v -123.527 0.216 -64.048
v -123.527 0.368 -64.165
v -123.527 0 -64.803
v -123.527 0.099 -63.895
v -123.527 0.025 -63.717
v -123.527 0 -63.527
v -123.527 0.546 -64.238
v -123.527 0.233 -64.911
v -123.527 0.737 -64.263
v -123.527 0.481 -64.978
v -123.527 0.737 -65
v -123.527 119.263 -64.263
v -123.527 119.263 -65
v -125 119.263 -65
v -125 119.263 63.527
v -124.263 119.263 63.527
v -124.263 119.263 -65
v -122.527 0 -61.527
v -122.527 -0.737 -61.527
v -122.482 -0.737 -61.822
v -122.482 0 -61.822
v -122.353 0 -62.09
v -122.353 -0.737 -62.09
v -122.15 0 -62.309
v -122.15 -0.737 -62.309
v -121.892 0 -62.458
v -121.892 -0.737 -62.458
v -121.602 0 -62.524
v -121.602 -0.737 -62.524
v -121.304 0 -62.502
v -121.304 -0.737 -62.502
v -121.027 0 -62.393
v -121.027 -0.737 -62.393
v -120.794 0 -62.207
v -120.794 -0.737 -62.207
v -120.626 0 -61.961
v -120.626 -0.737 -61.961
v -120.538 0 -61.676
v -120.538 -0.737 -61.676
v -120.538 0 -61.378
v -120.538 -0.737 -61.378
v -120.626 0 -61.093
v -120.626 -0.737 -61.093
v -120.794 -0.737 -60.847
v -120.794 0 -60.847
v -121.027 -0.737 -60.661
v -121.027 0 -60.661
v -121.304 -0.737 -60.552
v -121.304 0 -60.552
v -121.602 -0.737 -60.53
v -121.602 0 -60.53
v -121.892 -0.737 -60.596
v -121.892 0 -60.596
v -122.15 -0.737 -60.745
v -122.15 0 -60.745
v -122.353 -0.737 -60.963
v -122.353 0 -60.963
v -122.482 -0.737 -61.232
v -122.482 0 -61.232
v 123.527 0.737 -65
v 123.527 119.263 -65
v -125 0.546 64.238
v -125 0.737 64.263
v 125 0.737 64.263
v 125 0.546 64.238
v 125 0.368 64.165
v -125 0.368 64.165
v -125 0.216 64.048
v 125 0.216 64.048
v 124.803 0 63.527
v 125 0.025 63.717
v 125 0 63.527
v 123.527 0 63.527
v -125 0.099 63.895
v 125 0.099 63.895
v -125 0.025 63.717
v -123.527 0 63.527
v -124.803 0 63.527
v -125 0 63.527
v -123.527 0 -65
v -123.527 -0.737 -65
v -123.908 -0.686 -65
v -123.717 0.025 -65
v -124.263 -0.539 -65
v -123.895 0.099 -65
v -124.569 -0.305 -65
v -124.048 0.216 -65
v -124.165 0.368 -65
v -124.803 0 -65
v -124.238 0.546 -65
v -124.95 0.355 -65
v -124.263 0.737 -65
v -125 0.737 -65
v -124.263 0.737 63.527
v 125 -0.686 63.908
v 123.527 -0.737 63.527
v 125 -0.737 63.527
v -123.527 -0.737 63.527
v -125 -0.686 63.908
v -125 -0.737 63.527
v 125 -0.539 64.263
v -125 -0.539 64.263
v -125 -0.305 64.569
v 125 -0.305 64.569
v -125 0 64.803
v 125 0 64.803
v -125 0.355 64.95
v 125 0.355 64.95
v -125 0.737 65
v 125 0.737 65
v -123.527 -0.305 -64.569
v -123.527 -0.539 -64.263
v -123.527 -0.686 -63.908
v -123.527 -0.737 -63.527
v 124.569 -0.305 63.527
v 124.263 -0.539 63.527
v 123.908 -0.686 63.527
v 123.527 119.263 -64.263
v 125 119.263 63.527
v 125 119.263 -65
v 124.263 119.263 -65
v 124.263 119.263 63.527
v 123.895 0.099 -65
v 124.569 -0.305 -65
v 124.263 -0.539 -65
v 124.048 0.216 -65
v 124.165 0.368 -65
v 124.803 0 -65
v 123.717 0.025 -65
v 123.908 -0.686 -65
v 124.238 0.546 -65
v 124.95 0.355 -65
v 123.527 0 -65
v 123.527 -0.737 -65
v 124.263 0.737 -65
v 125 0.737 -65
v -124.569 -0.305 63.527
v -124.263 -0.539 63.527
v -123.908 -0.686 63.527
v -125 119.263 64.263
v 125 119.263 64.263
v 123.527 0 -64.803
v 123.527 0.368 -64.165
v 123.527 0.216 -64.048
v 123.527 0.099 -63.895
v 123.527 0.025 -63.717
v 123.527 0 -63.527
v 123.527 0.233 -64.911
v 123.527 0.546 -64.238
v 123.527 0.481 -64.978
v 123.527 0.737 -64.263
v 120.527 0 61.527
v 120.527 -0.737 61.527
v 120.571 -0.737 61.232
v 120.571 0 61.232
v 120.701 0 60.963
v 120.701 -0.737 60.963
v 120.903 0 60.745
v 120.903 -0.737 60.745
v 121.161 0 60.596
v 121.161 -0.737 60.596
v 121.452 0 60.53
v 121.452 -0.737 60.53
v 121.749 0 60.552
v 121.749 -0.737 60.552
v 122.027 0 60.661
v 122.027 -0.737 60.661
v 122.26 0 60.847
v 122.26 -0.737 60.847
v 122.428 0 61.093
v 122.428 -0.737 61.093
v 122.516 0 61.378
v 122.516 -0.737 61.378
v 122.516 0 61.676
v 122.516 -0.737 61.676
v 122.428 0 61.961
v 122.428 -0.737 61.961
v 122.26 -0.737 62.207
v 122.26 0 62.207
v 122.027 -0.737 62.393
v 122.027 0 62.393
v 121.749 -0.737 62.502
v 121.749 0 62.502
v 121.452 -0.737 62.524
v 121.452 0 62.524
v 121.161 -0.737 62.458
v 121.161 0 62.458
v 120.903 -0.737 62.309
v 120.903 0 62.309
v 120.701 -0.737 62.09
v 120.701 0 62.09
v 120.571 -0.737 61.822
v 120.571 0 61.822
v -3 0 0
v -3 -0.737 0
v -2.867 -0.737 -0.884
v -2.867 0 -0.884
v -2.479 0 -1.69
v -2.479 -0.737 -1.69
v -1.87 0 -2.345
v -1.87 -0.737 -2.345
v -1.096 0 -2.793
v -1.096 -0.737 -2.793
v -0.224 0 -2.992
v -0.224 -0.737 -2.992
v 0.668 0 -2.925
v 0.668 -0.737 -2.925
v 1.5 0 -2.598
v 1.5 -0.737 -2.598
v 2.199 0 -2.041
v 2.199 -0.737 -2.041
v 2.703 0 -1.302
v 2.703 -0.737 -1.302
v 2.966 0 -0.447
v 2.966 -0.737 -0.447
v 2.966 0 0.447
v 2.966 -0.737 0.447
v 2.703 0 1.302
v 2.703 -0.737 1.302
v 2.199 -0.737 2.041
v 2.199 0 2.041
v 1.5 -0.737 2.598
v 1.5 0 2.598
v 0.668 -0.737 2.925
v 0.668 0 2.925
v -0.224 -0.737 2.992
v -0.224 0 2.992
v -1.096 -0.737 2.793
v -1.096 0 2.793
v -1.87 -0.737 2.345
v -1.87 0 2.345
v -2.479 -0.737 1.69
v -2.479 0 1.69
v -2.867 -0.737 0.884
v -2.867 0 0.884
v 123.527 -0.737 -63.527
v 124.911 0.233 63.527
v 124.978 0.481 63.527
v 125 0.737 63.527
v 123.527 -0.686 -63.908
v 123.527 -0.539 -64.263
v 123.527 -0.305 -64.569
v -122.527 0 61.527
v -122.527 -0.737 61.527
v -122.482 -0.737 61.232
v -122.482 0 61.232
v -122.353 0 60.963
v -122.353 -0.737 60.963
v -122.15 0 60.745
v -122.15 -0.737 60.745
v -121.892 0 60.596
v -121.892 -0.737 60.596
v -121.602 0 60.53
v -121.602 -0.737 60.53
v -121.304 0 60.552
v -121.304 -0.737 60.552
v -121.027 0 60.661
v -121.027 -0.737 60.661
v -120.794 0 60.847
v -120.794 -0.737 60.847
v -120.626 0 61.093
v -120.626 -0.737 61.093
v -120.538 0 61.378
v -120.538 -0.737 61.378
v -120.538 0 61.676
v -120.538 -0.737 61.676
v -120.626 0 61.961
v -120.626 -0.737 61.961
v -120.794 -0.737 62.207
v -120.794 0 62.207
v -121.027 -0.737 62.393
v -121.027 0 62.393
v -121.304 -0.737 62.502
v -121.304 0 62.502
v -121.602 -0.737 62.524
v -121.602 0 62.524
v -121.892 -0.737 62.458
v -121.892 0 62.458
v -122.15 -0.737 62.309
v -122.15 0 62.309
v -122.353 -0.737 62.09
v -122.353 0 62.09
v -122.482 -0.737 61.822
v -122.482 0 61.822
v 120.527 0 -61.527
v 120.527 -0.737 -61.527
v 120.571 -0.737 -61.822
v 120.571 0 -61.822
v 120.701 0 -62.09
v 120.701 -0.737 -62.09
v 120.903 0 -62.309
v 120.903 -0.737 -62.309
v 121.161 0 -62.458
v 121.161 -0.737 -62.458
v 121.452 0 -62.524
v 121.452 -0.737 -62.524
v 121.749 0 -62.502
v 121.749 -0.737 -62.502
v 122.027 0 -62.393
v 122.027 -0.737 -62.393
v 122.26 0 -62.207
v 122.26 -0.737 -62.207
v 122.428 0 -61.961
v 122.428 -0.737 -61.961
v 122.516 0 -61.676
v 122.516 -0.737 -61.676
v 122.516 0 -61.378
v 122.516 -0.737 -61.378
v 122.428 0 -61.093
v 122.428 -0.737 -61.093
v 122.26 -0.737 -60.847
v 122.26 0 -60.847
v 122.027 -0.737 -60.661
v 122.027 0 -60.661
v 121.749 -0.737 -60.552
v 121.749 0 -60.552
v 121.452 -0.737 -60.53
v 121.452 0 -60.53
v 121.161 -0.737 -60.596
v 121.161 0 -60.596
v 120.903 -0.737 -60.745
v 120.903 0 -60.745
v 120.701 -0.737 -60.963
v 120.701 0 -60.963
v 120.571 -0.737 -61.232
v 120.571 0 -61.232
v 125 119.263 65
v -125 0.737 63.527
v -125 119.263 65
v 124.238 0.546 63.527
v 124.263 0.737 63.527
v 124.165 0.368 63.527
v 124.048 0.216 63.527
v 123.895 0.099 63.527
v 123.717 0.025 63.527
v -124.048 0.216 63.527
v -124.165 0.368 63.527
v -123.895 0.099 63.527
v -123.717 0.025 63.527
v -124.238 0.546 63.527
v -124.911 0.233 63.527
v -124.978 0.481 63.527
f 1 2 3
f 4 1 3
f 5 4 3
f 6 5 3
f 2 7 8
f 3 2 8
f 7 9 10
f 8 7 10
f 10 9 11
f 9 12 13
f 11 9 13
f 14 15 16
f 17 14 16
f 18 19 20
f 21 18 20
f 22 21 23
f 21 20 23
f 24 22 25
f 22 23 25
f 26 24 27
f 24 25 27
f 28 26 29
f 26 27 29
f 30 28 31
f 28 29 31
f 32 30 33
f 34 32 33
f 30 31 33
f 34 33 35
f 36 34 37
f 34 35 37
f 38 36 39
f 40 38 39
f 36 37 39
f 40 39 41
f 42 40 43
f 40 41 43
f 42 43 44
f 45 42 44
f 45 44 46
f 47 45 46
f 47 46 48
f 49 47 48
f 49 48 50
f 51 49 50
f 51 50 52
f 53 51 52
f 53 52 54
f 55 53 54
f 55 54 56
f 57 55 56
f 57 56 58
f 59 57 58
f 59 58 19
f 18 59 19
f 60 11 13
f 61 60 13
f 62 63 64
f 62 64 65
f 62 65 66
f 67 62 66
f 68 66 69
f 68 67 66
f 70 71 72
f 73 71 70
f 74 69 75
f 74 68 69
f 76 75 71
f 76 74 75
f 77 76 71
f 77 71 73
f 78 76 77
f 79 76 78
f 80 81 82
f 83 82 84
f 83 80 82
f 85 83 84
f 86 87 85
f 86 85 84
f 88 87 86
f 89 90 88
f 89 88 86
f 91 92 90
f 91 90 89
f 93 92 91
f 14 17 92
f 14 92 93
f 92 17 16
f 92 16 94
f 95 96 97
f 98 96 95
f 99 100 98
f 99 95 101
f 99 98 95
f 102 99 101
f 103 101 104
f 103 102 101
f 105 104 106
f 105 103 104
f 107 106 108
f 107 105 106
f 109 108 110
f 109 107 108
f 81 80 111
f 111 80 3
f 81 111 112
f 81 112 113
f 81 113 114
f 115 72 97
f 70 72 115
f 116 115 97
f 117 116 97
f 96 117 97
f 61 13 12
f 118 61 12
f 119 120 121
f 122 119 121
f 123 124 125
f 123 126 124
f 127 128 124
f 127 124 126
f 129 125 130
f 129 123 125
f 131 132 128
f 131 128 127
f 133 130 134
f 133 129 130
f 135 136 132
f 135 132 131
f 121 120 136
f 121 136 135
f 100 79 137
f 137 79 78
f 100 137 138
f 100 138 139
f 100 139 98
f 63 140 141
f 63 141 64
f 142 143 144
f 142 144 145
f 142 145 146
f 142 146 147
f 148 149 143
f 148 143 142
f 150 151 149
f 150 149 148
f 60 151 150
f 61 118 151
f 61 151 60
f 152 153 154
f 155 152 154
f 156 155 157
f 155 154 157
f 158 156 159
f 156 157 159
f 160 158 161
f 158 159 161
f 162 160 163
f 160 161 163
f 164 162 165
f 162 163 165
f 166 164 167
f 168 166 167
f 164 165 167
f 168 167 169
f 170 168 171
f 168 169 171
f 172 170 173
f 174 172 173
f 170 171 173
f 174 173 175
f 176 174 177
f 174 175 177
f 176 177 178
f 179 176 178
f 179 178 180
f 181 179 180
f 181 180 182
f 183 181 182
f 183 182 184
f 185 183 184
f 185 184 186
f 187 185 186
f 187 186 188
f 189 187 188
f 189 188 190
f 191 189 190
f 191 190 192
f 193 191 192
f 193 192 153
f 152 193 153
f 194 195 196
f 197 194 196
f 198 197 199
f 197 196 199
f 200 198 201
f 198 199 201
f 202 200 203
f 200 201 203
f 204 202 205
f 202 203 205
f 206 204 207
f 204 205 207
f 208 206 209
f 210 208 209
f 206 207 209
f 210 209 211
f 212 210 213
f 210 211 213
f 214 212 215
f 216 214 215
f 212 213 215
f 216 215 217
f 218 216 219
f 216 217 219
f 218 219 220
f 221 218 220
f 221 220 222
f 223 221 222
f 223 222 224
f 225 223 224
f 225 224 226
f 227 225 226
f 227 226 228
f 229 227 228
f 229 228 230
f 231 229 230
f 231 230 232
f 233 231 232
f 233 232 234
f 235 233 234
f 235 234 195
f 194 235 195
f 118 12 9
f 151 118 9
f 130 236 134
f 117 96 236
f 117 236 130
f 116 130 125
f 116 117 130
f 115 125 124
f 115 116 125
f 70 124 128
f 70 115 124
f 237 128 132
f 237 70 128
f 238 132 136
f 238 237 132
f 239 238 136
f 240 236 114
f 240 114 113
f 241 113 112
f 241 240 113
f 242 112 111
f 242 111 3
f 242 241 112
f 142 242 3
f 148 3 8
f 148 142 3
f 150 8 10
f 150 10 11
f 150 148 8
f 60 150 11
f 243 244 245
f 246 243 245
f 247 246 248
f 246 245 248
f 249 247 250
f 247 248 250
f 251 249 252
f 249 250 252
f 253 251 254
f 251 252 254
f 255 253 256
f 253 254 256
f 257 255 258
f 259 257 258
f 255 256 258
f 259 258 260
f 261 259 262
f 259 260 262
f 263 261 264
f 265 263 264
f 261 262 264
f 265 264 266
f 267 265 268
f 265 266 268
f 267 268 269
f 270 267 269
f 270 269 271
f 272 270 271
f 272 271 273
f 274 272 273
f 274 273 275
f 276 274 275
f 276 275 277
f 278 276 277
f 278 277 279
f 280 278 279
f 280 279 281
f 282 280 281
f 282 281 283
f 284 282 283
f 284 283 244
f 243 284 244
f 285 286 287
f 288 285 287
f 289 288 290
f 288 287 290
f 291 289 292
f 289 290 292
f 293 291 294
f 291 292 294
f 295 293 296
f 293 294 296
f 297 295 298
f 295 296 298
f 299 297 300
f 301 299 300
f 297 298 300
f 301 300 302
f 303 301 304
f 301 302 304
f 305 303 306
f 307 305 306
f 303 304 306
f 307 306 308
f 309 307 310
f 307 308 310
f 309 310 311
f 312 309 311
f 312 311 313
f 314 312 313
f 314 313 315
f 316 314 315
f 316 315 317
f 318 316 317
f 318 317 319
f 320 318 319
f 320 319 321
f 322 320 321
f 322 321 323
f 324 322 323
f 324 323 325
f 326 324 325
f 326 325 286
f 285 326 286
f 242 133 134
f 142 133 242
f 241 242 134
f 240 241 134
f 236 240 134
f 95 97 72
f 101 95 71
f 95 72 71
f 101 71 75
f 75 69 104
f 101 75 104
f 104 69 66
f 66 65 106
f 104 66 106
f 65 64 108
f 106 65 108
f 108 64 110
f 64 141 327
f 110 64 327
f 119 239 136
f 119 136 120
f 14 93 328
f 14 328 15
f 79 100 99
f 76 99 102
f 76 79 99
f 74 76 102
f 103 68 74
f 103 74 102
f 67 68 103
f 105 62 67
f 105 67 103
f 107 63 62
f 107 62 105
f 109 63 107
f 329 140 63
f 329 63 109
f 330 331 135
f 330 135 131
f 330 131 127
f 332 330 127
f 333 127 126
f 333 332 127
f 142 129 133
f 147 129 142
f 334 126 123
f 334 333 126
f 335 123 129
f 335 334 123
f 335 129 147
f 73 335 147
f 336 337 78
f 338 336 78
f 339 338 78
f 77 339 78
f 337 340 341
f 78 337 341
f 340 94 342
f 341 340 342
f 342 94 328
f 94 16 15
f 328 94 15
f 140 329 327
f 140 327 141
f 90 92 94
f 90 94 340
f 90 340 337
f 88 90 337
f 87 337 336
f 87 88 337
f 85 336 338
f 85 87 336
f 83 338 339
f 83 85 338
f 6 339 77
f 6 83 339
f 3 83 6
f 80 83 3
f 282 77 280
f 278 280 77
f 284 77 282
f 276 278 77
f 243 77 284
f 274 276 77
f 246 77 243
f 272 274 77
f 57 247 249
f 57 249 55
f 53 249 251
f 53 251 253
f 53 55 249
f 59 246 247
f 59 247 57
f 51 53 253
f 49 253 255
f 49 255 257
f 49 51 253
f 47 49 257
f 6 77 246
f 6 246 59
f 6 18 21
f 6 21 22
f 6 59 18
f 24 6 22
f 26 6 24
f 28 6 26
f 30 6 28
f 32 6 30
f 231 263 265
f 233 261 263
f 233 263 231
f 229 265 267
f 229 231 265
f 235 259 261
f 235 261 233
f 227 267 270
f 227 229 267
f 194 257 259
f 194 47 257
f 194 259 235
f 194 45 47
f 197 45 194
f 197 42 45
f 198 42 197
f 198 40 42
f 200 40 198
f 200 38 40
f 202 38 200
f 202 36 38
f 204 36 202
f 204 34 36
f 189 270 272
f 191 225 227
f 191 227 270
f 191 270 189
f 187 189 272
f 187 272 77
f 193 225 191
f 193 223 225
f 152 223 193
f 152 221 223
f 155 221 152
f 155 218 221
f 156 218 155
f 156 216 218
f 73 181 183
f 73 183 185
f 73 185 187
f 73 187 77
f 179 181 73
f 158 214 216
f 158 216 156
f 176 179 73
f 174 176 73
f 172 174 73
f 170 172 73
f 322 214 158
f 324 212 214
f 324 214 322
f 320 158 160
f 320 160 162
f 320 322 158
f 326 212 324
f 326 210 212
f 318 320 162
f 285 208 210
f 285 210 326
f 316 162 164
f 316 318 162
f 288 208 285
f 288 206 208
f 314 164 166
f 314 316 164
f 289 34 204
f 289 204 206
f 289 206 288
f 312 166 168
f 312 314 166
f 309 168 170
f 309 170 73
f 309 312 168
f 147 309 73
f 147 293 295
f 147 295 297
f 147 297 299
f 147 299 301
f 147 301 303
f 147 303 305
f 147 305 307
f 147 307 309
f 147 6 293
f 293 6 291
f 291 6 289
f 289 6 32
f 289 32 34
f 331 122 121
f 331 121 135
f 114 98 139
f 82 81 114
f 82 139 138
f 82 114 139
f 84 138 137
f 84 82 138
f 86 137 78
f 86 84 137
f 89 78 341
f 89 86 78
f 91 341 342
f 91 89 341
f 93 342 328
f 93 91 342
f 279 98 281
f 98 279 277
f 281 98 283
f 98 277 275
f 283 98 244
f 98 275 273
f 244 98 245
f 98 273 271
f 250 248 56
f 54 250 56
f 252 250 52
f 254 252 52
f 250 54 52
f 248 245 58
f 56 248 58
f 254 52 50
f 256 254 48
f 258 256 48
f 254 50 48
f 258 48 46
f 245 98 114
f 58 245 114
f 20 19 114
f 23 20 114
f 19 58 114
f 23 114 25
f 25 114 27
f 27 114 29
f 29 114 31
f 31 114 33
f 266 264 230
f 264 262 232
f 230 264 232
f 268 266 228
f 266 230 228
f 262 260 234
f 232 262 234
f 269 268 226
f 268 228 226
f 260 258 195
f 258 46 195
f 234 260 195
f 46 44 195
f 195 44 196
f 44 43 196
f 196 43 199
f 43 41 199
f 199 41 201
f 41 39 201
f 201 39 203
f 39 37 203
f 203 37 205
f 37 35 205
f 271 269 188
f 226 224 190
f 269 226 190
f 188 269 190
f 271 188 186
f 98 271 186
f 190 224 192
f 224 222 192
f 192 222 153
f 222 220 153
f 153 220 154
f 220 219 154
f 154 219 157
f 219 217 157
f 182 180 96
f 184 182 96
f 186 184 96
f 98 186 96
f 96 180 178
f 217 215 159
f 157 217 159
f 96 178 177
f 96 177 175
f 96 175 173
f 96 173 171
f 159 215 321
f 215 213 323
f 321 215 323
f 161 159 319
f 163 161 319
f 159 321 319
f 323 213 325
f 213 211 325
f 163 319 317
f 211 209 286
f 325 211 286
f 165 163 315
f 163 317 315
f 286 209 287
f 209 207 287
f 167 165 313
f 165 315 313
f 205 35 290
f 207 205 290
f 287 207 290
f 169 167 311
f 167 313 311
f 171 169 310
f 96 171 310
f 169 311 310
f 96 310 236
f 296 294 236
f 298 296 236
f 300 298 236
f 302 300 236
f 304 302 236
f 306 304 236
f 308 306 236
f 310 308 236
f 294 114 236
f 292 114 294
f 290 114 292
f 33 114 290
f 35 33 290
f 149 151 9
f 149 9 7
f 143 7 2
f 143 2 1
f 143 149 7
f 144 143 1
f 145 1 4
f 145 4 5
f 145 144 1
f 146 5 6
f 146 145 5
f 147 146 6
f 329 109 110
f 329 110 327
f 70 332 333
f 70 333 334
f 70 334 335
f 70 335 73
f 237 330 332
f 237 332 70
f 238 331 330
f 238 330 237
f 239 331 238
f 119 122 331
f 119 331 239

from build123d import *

# Parameters (mm, degrees)
SKETCH1_W                    = 250
SKETCH1_H                    = 130
BASE_FLANGE1_DEPTH           = 0.7366
F_6_0_6_DIAMETER_HOLE1_D     = 6
EDGE_FLANGE1_STRIP_W         = 4.4196
EDGE_FLANGE1_STRIP_H         = 0.7366
EDGE_FLANGE1_STRIP_CUT_DEPTH = 250
EDGE_FLANGE1_DEPTH           = 250
EDGE_FLANGE2_STRIP_W         = 4.4196
EDGE_FLANGE2_STRIP_H         = 0.7366
EDGE_FLANGE2_STRIP_CUT_DEPTH = 128.5268
EDGE_FLANGE2_DEPTH           = 128.5268
EDGE_FLANGE3_STRIP_W         = 4.4196
EDGE_FLANGE3_STRIP_H         = 0.7366
EDGE_FLANGE3_STRIP_CUT_DEPTH = 128.5268
EDGE_FLANGE3_DEPTH           = 128.5268
EDGE_FLANGE4_STRIP_W         = 4.4196
EDGE_FLANGE4_STRIP_H         = 0.7366
EDGE_FLANGE4_STRIP_CUT_DEPTH = 247.0536
EDGE_FLANGE4_DEPTH           = 247.0536
F_2_0_2_DIAMETER_HOLE2_D     = 2
F_2_0_2_DIAMETER_HOLE3_D     = 2


# Sheet-metal steps are written as plain solids
with BuildPart() as part:
    # Sketch1 → Base-Flange1 (new body)
    with BuildSketch(Plane(origin=(0, 0, 0), x_dir=(1, 0, 0), z_dir=(0, 1, 0))):
        Rectangle(SKETCH1_W, SKETCH1_H)
    extrude(amount=-BASE_FLANGE1_DEPTH)

    # Ø6.0 (6) Diameter Hole1 (through all)
    with Locations(Plane(origin=(0, 0, 0), x_dir=(1, 0, 0), z_dir=(0, 1, 0))):
        with Locations((0, 0)):
            Hole(F_6_0_6_DIAMETER_HOLE1_D / 2)

    # Edge-Flange1 strip (across the edge) → Edge-Flange1 strip cut (cut)
    with BuildSketch(Plane(origin=(-125, 0, 65), x_dir=(0, 0, -1), z_dir=(1, 0, 0))):
        with Locations((-0.7366, -0.3683)):
            Rectangle(EDGE_FLANGE1_STRIP_W, EDGE_FLANGE1_STRIP_H)
    extrude(amount=EDGE_FLANGE1_STRIP_CUT_DEPTH, mode=Mode.SUBTRACT)

    # Edge-Flange1 section (across the edge) → Edge-Flange1 (add)
    with BuildSketch(Plane(origin=(-125, 0, 65), x_dir=(0, 0, -1), z_dir=(1, 0, 0))):
        with BuildLine():
            Line((0, 0.7366), (0, 119.2634))
            Line((0, 119.2634), (0.7366, 119.2634))
            Line((0.7366, 119.2634), (0.7366, 0.7366))
            ThreePointArc((0.7366, 0.7366), (0.952345145, 0.215745145), (1.4732, 0))
            Line((1.4732, 0), (1.4732, -0.7366))
            ThreePointArc((1.4732, -0.7366), (0.43149029, -0.30510971), (0, 0.7366))
        make_face()
    extrude(amount=EDGE_FLANGE1_DEPTH)

    # Edge-Flange2 strip (across the edge) → Edge-Flange2 strip cut (cut)
    with BuildSketch(Plane(origin=(125, 0, 63.5268), x_dir=(-1, 0, 0), z_dir=(0, 0, -1))):
        with Locations((-0.7366, -0.3683)):
            Rectangle(EDGE_FLANGE2_STRIP_W, EDGE_FLANGE2_STRIP_H)
    extrude(amount=EDGE_FLANGE2_STRIP_CUT_DEPTH, mode=Mode.SUBTRACT)

    # Edge-Flange2 section (across the edge) → Edge-Flange2 (add)
    with BuildSketch(Plane(origin=(125, 0, 63.5268), x_dir=(-1, 0, 0), z_dir=(0, 0, -1))):
        with BuildLine():
            Line((0, 0.7366), (0, 119.2634))
            Line((0, 119.2634), (0.7366, 119.2634))
            Line((0.7366, 119.2634), (0.7366, 0.7366))
            ThreePointArc((0.7366, 0.7366), (0.952345145, 0.215745145), (1.4732, 0))
            Line((1.4732, 0), (1.4732, -0.7366))
            ThreePointArc((1.4732, -0.7366), (0.43149029, -0.30510971), (0, 0.7366))
        make_face()
    extrude(amount=EDGE_FLANGE2_DEPTH)

    # Edge-Flange3 strip (across the edge) → Edge-Flange3 strip cut (cut)
    with BuildSketch(Plane(origin=(-125, 0, -65), x_dir=(1, 0, 0), z_dir=(0, 0, 1))):
        with Locations((-0.7366, -0.3683)):
            Rectangle(EDGE_FLANGE3_STRIP_W, EDGE_FLANGE3_STRIP_H)
    extrude(amount=EDGE_FLANGE3_STRIP_CUT_DEPTH, mode=Mode.SUBTRACT)

    # Edge-Flange3 section (across the edge) → Edge-Flange3 (add)
    with BuildSketch(Plane(origin=(-125, 0, -65), x_dir=(1, 0, 0), z_dir=(0, 0, 1))):
        with BuildLine():
            Line((0, 0.7366), (0, 119.2634))
            Line((0, 119.2634), (0.7366, 119.2634))
            Line((0.7366, 119.2634), (0.7366, 0.7366))
            ThreePointArc((0.7366, 0.7366), (0.952345145, 0.215745145), (1.4732, 0))
            Line((1.4732, 0), (1.4732, -0.7366))
            ThreePointArc((1.4732, -0.7366), (0.43149029, -0.30510971), (0, 0.7366))
        make_face()
    extrude(amount=EDGE_FLANGE3_DEPTH)

    # Edge-Flange4 strip (across the edge) → Edge-Flange4 strip cut (cut)
    with BuildSketch(Plane(origin=(123.5268, 0, -65), x_dir=(0, 0, 1), z_dir=(-1, 0, 0))):
        with Locations((-0.7366, -0.3683)):
            Rectangle(EDGE_FLANGE4_STRIP_W, EDGE_FLANGE4_STRIP_H)
    extrude(amount=EDGE_FLANGE4_STRIP_CUT_DEPTH, mode=Mode.SUBTRACT)

    # Edge-Flange4 section (across the edge) → Edge-Flange4 (add)
    with BuildSketch(Plane(origin=(123.5268, 0, -65), x_dir=(0, 0, 1), z_dir=(-1, 0, 0))):
        with BuildLine():
            Line((0, 0.7366), (0, 119.2634))
            Line((0, 119.2634), (0.7366, 119.2634))
            Line((0.7366, 119.2634), (0.7366, 0.7366))
            ThreePointArc((0.7366, 0.7366), (0.952345145, 0.215745145), (1.4732, 0))
            Line((1.4732, 0), (1.4732, -0.7366))
            ThreePointArc((1.4732, -0.7366), (0.43149029, -0.30510971), (0, 0.7366))
        make_face()
    extrude(amount=EDGE_FLANGE4_DEPTH)

    # Ø2.0 (2) Diameter Hole2 (through all)
    with Locations(Plane(origin=(0, 0, 0), x_dir=(1, 0, 0), z_dir=(0, 1, 0))):
        with Locations((-121.5268, 61.5268)):
            Hole(F_2_0_2_DIAMETER_HOLE2_D / 2)

    # Ø2.0 (2) Diameter Hole3 (through all)
    with Locations(Plane(origin=(0, 0, 0), x_dir=(1, 0, 0), z_dir=(0, 1, 0))):
        with Locations((-121.5268, -61.5268), (121.5268, 61.5268), (121.5268, -61.5268)):
            Hole(F_2_0_2_DIAMETER_HOLE3_D / 2)


solid = part.part
